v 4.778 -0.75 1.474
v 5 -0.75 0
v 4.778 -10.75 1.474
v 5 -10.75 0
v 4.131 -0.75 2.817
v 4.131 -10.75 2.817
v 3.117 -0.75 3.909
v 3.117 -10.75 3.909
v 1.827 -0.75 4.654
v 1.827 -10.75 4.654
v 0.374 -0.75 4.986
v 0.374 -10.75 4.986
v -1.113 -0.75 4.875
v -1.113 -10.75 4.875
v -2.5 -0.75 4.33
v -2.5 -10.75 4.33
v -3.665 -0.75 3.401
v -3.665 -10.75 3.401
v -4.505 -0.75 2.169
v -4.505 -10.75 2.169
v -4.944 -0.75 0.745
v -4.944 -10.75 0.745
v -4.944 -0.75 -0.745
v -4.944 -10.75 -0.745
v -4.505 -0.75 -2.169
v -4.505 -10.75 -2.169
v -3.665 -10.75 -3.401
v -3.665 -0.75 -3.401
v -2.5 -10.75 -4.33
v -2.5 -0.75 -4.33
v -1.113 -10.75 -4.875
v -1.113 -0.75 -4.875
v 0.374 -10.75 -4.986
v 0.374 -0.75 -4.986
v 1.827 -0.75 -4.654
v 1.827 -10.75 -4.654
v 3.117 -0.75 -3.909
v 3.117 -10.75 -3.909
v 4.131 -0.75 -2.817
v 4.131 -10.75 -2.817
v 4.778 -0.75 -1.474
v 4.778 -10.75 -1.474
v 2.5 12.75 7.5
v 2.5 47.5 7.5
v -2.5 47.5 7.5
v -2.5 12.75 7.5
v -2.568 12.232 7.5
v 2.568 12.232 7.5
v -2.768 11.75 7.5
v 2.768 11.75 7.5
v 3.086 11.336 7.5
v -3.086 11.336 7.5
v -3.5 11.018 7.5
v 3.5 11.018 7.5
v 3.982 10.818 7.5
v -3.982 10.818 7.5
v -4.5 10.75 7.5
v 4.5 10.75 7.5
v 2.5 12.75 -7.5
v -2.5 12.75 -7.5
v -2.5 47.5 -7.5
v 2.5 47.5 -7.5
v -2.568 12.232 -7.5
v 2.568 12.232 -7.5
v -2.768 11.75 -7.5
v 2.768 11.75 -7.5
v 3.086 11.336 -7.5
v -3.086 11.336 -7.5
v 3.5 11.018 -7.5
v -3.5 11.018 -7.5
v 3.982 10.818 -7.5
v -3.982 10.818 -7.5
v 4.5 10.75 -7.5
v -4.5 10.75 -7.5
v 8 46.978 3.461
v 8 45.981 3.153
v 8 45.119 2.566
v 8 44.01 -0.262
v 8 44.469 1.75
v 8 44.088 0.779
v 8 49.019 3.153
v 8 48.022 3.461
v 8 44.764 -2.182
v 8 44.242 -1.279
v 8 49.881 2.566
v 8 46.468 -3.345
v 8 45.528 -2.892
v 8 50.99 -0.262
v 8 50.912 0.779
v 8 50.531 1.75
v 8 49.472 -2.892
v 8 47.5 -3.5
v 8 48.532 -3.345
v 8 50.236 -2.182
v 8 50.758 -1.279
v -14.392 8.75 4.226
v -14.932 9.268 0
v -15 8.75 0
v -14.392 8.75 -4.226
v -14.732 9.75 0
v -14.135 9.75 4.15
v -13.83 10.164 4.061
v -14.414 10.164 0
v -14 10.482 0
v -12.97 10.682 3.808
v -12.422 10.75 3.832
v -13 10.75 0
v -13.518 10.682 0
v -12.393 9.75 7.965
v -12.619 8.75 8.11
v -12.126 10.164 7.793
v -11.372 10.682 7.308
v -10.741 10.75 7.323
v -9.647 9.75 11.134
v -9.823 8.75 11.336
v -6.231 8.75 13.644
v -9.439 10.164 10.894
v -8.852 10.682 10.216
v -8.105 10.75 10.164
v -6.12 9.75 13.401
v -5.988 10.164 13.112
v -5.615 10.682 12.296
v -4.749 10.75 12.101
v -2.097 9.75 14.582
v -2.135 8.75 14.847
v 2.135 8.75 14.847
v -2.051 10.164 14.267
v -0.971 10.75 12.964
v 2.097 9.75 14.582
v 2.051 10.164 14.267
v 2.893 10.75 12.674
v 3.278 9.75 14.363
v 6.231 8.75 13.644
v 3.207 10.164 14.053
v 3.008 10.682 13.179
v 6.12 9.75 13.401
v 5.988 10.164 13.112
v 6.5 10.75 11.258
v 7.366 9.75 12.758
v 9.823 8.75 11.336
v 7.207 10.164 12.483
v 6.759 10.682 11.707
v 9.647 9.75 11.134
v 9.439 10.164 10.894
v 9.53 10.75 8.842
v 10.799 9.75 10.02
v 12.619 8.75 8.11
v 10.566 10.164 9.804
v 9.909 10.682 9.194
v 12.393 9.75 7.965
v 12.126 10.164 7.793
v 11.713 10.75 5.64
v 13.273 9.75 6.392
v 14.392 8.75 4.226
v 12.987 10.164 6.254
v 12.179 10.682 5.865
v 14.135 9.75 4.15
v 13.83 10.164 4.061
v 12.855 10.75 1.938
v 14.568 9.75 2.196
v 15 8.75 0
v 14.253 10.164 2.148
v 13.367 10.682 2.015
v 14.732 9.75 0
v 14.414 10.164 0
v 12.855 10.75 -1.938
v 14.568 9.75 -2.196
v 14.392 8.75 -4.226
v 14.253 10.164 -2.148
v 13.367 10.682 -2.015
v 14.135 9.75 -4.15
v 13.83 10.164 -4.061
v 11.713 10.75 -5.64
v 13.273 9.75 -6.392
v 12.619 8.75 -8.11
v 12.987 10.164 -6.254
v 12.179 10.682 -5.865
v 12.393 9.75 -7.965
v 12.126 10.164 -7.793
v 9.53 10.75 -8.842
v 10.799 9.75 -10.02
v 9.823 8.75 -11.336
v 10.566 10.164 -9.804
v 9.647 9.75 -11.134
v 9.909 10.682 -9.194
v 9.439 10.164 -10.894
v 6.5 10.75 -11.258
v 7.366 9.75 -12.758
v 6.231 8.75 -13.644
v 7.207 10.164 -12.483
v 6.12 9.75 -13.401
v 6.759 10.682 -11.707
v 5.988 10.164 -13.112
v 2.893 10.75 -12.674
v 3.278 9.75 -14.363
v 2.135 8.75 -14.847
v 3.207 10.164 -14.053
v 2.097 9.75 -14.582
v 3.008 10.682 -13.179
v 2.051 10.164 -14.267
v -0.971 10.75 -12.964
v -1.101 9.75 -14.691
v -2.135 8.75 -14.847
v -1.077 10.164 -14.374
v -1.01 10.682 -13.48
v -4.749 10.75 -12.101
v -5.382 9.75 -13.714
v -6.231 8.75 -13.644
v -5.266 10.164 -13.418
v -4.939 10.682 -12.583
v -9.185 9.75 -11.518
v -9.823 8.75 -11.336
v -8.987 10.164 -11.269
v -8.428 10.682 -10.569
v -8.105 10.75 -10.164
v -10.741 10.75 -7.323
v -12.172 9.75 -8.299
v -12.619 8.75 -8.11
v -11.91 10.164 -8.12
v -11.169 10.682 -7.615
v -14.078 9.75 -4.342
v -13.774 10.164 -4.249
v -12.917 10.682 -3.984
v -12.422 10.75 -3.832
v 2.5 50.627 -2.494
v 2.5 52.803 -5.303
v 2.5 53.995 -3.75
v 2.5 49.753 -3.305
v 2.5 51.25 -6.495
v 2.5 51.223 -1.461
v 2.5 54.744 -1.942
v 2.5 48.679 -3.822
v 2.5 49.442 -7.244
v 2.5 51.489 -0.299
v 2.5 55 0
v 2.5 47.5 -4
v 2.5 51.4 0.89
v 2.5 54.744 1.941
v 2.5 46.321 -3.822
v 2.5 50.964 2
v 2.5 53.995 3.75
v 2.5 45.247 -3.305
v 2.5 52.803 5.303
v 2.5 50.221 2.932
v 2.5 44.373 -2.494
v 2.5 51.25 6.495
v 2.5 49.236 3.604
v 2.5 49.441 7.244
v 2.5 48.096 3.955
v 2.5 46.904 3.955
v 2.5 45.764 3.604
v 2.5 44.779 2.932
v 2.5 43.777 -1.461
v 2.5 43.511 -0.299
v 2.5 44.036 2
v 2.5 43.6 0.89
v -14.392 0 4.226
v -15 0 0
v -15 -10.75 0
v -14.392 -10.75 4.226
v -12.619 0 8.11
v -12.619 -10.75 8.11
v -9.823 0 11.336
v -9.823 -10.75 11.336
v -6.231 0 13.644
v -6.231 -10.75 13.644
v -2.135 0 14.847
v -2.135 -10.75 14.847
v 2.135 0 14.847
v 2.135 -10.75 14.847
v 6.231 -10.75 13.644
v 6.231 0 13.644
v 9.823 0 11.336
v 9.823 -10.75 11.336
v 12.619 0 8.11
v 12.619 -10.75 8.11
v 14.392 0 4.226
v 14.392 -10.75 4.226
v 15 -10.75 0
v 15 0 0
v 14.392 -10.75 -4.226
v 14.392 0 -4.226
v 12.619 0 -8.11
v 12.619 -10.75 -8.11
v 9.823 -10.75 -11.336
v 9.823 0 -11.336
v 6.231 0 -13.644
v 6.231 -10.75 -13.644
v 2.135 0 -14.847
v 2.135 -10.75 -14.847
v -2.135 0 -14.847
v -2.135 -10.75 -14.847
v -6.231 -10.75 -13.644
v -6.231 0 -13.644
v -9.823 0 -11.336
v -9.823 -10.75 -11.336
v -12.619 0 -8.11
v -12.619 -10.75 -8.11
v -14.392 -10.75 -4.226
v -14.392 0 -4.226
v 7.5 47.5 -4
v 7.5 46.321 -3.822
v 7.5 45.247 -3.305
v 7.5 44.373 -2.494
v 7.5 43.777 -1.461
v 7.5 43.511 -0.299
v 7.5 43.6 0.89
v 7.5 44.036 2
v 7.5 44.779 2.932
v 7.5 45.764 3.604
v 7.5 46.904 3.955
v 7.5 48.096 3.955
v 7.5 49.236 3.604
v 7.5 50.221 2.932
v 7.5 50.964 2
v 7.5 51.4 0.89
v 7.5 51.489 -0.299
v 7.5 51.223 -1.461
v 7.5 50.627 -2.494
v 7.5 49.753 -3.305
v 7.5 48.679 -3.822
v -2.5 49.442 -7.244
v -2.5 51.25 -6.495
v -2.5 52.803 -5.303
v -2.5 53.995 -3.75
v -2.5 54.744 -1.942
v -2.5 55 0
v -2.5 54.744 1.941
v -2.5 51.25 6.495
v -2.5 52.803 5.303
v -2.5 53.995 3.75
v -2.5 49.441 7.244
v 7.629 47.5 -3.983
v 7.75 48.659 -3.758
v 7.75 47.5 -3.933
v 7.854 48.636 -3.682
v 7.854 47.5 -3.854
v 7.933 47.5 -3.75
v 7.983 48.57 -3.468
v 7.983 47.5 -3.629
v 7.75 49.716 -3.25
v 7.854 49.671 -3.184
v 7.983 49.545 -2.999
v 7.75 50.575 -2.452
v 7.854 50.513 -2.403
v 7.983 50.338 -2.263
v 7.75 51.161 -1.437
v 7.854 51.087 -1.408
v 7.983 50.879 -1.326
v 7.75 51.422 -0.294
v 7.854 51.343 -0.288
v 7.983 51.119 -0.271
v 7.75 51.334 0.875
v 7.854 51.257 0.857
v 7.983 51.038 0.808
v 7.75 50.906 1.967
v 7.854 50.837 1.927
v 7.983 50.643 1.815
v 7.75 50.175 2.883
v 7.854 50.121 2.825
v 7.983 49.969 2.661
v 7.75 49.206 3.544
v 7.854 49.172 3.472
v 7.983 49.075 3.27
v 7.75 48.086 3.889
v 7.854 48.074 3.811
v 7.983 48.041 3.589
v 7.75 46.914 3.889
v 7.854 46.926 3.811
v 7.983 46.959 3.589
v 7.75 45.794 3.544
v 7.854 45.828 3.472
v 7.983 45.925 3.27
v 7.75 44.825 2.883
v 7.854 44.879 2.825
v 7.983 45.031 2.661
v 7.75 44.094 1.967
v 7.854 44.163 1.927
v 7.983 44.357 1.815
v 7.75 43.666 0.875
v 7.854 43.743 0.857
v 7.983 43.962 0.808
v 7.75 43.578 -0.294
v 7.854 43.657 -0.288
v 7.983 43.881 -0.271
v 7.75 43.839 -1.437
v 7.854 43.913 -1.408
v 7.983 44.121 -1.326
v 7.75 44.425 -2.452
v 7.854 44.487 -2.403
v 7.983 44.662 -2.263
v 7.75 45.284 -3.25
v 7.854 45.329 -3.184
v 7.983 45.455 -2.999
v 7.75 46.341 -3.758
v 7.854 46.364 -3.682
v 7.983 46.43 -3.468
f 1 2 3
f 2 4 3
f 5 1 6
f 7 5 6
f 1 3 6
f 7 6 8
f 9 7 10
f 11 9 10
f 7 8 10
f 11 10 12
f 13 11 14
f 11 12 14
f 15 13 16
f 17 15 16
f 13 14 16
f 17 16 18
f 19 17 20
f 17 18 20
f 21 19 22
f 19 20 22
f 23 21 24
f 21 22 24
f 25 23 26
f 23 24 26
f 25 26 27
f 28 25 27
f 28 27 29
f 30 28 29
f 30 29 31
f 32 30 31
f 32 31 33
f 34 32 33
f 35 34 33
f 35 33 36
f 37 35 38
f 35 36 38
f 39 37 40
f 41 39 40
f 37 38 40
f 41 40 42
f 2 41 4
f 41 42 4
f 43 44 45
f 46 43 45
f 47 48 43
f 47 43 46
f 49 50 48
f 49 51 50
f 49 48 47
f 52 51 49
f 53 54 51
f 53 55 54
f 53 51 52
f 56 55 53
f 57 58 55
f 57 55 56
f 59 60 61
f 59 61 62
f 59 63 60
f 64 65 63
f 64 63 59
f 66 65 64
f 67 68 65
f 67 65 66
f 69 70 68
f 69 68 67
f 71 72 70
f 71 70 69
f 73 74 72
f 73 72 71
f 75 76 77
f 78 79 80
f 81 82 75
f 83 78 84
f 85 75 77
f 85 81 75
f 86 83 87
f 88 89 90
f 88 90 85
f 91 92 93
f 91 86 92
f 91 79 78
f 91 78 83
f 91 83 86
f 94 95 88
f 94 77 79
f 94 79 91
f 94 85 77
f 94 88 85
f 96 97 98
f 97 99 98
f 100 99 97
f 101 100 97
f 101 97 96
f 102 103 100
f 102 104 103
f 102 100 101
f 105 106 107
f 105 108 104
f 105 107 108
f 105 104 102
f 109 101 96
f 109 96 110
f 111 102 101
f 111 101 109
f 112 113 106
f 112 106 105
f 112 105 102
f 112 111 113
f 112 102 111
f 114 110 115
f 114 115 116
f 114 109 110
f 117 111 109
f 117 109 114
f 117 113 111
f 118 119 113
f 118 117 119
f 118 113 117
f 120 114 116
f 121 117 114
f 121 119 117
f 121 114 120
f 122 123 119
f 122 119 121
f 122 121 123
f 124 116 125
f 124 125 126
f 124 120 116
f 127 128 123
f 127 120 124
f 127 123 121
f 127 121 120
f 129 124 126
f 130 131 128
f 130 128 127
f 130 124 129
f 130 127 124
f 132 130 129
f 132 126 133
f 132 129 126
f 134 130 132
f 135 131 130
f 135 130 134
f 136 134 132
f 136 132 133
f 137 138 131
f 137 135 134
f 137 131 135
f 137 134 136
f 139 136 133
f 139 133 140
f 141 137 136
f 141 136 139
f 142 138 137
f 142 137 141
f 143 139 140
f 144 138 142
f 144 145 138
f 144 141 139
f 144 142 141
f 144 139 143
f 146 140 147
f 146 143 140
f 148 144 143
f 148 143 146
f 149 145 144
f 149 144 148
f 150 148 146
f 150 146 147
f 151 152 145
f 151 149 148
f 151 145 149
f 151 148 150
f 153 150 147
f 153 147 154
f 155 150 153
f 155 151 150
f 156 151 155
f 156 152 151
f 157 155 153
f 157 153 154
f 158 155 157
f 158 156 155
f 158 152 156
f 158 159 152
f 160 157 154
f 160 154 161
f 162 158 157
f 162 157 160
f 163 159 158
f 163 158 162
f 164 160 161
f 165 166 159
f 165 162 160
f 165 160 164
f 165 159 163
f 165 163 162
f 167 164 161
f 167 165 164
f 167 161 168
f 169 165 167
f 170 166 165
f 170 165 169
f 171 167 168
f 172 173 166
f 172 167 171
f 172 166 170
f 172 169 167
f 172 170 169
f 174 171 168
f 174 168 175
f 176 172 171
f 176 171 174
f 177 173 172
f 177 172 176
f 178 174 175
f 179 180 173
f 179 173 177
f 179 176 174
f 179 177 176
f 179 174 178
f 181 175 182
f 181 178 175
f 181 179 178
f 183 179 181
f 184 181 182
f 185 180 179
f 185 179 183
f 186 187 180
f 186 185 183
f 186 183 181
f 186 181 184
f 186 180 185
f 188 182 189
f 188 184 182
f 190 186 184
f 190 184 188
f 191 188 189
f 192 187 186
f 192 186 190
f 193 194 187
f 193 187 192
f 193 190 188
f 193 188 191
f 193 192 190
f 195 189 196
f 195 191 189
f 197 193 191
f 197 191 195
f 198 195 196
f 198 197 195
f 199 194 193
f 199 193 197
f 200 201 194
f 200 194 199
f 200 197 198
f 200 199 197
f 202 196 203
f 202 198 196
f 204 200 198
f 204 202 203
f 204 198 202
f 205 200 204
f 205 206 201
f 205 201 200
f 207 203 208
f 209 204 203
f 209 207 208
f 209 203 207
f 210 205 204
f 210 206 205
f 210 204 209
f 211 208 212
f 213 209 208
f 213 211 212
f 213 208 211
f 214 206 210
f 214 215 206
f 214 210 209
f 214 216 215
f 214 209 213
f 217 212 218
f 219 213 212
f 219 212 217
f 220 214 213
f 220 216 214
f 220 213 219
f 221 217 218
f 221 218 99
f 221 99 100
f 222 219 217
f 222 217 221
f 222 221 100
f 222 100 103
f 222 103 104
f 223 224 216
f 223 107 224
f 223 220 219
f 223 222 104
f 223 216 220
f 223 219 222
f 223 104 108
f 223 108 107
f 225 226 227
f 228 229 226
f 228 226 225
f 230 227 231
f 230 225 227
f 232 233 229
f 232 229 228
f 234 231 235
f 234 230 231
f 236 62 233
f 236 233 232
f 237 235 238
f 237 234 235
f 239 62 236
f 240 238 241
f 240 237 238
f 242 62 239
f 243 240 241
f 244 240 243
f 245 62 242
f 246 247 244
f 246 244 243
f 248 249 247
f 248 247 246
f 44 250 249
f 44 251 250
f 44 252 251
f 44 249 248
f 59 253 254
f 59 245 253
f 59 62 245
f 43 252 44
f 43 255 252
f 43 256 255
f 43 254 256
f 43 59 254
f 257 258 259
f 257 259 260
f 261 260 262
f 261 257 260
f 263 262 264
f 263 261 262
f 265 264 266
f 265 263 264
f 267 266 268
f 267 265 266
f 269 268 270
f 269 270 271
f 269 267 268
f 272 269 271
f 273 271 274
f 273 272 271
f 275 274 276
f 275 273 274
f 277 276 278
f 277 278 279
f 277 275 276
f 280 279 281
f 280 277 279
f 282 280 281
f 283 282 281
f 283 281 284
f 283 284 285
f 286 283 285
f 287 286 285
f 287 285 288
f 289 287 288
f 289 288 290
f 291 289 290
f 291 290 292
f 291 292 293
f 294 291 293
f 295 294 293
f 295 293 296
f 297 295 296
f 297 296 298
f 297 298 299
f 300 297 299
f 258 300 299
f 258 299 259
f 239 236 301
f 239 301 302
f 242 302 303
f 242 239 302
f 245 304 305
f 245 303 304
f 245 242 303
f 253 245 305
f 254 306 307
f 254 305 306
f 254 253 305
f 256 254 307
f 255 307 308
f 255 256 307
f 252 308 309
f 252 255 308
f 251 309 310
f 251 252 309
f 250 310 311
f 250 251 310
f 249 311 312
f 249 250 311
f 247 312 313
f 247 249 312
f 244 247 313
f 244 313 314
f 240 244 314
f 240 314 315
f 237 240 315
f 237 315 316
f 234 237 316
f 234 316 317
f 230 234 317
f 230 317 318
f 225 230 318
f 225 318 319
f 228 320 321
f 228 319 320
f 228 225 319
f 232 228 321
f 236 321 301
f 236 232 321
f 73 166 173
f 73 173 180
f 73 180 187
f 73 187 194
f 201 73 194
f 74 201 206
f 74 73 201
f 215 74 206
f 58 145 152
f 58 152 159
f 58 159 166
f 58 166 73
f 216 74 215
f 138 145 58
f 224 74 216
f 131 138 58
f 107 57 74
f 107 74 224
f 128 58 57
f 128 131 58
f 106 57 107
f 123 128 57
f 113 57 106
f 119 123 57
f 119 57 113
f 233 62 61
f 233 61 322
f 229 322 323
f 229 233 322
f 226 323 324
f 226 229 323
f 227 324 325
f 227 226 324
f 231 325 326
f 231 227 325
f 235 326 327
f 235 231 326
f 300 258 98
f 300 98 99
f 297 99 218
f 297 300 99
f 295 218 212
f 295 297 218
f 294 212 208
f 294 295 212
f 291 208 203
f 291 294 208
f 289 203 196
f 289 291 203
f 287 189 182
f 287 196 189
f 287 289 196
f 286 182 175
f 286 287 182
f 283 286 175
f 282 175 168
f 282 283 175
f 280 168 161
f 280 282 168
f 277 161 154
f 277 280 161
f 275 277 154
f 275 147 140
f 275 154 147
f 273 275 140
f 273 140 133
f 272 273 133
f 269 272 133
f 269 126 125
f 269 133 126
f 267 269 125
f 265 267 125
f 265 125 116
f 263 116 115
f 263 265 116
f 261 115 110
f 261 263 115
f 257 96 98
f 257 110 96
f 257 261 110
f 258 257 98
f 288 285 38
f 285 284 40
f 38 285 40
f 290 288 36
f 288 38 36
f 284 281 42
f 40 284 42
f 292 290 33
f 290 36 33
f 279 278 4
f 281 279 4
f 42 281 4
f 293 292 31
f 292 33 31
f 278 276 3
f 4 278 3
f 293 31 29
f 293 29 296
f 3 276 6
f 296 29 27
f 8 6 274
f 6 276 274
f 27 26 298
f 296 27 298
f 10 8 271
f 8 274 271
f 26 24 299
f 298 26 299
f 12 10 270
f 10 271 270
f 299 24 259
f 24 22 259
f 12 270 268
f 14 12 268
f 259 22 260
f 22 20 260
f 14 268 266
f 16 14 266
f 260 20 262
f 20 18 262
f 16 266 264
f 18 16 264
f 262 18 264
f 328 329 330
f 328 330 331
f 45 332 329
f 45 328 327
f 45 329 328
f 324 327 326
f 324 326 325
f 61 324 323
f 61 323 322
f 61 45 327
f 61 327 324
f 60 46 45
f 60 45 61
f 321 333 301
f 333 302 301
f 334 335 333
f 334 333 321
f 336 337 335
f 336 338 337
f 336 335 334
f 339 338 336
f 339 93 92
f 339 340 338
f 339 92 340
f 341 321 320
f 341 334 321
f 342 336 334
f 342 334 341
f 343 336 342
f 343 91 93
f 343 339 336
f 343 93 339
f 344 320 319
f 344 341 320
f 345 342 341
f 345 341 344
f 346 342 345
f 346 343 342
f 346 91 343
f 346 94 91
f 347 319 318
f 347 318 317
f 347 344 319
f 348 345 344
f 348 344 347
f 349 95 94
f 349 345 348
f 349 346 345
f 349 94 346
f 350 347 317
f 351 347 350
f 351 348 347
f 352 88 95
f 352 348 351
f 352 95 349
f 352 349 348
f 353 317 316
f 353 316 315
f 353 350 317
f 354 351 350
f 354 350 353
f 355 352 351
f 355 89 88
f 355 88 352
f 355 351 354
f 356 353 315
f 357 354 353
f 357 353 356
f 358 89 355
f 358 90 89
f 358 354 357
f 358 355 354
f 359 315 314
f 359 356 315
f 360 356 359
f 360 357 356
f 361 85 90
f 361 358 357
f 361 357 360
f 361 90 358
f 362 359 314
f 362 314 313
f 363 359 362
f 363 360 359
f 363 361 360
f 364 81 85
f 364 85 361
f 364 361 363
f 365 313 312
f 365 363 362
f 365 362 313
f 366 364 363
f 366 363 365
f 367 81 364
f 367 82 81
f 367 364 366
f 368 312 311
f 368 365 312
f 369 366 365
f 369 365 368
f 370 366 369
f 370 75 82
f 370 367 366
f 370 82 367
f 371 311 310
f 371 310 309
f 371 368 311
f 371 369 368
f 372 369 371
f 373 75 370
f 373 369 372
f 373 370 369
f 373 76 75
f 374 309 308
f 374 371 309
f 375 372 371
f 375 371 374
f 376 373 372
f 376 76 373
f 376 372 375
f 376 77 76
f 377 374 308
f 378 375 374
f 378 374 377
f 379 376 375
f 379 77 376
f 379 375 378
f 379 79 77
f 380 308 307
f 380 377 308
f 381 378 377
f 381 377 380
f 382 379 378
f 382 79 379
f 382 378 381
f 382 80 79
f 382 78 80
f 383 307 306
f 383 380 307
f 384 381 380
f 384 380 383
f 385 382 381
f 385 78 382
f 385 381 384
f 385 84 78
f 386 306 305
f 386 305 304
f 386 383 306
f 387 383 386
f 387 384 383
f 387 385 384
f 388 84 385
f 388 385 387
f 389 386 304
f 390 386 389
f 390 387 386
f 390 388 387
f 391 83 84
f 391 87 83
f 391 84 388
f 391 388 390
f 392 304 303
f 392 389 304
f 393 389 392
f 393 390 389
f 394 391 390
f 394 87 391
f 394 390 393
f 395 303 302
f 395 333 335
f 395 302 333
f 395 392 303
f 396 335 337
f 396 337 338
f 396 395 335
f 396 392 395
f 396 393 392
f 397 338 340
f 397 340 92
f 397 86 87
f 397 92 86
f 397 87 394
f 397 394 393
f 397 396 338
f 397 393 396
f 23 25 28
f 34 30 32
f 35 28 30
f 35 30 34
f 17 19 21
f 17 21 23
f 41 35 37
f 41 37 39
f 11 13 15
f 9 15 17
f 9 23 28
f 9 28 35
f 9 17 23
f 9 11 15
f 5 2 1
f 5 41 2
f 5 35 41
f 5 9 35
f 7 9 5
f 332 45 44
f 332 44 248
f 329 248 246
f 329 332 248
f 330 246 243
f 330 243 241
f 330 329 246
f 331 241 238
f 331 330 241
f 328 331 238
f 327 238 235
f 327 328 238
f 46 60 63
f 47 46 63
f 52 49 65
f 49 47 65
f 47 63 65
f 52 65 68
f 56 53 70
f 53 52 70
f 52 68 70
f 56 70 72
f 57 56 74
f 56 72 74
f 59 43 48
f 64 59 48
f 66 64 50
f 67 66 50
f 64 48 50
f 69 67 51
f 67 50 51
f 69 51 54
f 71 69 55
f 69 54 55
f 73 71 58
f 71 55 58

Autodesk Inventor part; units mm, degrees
ref_plane "YZ Plane" through (0, 0, 0) normal (1, 0, 0) x (0, 1, 0)
ref_plane "XZ Plane" through (0, 0, 0) normal (0, 1, 0) x (-1, 0, 0)
ref_plane "XY Plane" through (0, 0, 0) normal (0, 0, 1) x (1, 0, 0)
sketch "Esboço1" plane through (0, 0, 0) normal (0, 1, 0) x (-1, 0, 0)
  circle A0 centre (0, 0) radius 15
  dimension "d0" = 30
extrude "Extrusão1" add sketch "Esboço1" along normal mid plane 21.5
fillet "Arredondamento1" radius 2 1 edges at (15, 10.75, 0)
sketch "Esboço2" plane through (0, -10.75, 0) normal (0, -1, 0) x (1, 0, 0)
  circle A0 centre (0, 0) radius 5
  dimension "d4" = 10
extrude "Extrusão2" cut sketch "Esboço2" against normal blind 10
sketch "Esboço3" plane through (0, 10.75, 0) normal (0, 1, 0) x (1, 0, 0)
  line L0 (2.5, -7.5) -> (-2.5, -7.5)
  line L1 (-2.5, -7.5) -> (-2.5, 7.5)
  line L2 (-2.5, 7.5) -> (2.5, 7.5)
  line L3 (2.5, 7.5) -> (2.5, -7.5)
  line L4 (2.5, -7.5) -> (-2.5, 7.5) construction
  line L5 (-2.5, -7.5) -> (2.5, 7.5) construction
  point P0 (0, 0)
  dimension "d7" = 5
  dimension "d8" = 15
extrude "Extrusão3" add sketch "Esboço3" along normal blind 44.25
fillet "Arredondamento2" radius 7.5 1 edges at (0, 55, 7.5)
fillet "Arredondamento3" radius 7.5 1 edges at (0, 55, -7.5)
fillet "Arredondamento4" radius 2 1 edges at (2.5, 10.75, 0)
fillet "Arredondamento5" radius 2 1 edges at (-2.5, 10.75, 0)
sketch "Esboço4" plane through (2.5, 47.5, 0) normal (1, 0, 0) x (0, 0, -1)
  line L0 (-7.5, -34.75) -> (-7.5, 0) projected
  line L1 (7.5, -34.75) -> (7.5, 0) projected
  line L2 (-7.5, 0) -> (7.5, 0) construction
  circle A0 centre (0, 0) radius 4
  point P0 (0, -47.5)
  dimension "d15" = 8
extrude "Extrusão4" add sketch "Esboço4" along normal blind 5.5
fillet "Arredondamento6" radius 0.5 1 edges at (8, 47.5, 4)
properties part number "Corpo do robo"
